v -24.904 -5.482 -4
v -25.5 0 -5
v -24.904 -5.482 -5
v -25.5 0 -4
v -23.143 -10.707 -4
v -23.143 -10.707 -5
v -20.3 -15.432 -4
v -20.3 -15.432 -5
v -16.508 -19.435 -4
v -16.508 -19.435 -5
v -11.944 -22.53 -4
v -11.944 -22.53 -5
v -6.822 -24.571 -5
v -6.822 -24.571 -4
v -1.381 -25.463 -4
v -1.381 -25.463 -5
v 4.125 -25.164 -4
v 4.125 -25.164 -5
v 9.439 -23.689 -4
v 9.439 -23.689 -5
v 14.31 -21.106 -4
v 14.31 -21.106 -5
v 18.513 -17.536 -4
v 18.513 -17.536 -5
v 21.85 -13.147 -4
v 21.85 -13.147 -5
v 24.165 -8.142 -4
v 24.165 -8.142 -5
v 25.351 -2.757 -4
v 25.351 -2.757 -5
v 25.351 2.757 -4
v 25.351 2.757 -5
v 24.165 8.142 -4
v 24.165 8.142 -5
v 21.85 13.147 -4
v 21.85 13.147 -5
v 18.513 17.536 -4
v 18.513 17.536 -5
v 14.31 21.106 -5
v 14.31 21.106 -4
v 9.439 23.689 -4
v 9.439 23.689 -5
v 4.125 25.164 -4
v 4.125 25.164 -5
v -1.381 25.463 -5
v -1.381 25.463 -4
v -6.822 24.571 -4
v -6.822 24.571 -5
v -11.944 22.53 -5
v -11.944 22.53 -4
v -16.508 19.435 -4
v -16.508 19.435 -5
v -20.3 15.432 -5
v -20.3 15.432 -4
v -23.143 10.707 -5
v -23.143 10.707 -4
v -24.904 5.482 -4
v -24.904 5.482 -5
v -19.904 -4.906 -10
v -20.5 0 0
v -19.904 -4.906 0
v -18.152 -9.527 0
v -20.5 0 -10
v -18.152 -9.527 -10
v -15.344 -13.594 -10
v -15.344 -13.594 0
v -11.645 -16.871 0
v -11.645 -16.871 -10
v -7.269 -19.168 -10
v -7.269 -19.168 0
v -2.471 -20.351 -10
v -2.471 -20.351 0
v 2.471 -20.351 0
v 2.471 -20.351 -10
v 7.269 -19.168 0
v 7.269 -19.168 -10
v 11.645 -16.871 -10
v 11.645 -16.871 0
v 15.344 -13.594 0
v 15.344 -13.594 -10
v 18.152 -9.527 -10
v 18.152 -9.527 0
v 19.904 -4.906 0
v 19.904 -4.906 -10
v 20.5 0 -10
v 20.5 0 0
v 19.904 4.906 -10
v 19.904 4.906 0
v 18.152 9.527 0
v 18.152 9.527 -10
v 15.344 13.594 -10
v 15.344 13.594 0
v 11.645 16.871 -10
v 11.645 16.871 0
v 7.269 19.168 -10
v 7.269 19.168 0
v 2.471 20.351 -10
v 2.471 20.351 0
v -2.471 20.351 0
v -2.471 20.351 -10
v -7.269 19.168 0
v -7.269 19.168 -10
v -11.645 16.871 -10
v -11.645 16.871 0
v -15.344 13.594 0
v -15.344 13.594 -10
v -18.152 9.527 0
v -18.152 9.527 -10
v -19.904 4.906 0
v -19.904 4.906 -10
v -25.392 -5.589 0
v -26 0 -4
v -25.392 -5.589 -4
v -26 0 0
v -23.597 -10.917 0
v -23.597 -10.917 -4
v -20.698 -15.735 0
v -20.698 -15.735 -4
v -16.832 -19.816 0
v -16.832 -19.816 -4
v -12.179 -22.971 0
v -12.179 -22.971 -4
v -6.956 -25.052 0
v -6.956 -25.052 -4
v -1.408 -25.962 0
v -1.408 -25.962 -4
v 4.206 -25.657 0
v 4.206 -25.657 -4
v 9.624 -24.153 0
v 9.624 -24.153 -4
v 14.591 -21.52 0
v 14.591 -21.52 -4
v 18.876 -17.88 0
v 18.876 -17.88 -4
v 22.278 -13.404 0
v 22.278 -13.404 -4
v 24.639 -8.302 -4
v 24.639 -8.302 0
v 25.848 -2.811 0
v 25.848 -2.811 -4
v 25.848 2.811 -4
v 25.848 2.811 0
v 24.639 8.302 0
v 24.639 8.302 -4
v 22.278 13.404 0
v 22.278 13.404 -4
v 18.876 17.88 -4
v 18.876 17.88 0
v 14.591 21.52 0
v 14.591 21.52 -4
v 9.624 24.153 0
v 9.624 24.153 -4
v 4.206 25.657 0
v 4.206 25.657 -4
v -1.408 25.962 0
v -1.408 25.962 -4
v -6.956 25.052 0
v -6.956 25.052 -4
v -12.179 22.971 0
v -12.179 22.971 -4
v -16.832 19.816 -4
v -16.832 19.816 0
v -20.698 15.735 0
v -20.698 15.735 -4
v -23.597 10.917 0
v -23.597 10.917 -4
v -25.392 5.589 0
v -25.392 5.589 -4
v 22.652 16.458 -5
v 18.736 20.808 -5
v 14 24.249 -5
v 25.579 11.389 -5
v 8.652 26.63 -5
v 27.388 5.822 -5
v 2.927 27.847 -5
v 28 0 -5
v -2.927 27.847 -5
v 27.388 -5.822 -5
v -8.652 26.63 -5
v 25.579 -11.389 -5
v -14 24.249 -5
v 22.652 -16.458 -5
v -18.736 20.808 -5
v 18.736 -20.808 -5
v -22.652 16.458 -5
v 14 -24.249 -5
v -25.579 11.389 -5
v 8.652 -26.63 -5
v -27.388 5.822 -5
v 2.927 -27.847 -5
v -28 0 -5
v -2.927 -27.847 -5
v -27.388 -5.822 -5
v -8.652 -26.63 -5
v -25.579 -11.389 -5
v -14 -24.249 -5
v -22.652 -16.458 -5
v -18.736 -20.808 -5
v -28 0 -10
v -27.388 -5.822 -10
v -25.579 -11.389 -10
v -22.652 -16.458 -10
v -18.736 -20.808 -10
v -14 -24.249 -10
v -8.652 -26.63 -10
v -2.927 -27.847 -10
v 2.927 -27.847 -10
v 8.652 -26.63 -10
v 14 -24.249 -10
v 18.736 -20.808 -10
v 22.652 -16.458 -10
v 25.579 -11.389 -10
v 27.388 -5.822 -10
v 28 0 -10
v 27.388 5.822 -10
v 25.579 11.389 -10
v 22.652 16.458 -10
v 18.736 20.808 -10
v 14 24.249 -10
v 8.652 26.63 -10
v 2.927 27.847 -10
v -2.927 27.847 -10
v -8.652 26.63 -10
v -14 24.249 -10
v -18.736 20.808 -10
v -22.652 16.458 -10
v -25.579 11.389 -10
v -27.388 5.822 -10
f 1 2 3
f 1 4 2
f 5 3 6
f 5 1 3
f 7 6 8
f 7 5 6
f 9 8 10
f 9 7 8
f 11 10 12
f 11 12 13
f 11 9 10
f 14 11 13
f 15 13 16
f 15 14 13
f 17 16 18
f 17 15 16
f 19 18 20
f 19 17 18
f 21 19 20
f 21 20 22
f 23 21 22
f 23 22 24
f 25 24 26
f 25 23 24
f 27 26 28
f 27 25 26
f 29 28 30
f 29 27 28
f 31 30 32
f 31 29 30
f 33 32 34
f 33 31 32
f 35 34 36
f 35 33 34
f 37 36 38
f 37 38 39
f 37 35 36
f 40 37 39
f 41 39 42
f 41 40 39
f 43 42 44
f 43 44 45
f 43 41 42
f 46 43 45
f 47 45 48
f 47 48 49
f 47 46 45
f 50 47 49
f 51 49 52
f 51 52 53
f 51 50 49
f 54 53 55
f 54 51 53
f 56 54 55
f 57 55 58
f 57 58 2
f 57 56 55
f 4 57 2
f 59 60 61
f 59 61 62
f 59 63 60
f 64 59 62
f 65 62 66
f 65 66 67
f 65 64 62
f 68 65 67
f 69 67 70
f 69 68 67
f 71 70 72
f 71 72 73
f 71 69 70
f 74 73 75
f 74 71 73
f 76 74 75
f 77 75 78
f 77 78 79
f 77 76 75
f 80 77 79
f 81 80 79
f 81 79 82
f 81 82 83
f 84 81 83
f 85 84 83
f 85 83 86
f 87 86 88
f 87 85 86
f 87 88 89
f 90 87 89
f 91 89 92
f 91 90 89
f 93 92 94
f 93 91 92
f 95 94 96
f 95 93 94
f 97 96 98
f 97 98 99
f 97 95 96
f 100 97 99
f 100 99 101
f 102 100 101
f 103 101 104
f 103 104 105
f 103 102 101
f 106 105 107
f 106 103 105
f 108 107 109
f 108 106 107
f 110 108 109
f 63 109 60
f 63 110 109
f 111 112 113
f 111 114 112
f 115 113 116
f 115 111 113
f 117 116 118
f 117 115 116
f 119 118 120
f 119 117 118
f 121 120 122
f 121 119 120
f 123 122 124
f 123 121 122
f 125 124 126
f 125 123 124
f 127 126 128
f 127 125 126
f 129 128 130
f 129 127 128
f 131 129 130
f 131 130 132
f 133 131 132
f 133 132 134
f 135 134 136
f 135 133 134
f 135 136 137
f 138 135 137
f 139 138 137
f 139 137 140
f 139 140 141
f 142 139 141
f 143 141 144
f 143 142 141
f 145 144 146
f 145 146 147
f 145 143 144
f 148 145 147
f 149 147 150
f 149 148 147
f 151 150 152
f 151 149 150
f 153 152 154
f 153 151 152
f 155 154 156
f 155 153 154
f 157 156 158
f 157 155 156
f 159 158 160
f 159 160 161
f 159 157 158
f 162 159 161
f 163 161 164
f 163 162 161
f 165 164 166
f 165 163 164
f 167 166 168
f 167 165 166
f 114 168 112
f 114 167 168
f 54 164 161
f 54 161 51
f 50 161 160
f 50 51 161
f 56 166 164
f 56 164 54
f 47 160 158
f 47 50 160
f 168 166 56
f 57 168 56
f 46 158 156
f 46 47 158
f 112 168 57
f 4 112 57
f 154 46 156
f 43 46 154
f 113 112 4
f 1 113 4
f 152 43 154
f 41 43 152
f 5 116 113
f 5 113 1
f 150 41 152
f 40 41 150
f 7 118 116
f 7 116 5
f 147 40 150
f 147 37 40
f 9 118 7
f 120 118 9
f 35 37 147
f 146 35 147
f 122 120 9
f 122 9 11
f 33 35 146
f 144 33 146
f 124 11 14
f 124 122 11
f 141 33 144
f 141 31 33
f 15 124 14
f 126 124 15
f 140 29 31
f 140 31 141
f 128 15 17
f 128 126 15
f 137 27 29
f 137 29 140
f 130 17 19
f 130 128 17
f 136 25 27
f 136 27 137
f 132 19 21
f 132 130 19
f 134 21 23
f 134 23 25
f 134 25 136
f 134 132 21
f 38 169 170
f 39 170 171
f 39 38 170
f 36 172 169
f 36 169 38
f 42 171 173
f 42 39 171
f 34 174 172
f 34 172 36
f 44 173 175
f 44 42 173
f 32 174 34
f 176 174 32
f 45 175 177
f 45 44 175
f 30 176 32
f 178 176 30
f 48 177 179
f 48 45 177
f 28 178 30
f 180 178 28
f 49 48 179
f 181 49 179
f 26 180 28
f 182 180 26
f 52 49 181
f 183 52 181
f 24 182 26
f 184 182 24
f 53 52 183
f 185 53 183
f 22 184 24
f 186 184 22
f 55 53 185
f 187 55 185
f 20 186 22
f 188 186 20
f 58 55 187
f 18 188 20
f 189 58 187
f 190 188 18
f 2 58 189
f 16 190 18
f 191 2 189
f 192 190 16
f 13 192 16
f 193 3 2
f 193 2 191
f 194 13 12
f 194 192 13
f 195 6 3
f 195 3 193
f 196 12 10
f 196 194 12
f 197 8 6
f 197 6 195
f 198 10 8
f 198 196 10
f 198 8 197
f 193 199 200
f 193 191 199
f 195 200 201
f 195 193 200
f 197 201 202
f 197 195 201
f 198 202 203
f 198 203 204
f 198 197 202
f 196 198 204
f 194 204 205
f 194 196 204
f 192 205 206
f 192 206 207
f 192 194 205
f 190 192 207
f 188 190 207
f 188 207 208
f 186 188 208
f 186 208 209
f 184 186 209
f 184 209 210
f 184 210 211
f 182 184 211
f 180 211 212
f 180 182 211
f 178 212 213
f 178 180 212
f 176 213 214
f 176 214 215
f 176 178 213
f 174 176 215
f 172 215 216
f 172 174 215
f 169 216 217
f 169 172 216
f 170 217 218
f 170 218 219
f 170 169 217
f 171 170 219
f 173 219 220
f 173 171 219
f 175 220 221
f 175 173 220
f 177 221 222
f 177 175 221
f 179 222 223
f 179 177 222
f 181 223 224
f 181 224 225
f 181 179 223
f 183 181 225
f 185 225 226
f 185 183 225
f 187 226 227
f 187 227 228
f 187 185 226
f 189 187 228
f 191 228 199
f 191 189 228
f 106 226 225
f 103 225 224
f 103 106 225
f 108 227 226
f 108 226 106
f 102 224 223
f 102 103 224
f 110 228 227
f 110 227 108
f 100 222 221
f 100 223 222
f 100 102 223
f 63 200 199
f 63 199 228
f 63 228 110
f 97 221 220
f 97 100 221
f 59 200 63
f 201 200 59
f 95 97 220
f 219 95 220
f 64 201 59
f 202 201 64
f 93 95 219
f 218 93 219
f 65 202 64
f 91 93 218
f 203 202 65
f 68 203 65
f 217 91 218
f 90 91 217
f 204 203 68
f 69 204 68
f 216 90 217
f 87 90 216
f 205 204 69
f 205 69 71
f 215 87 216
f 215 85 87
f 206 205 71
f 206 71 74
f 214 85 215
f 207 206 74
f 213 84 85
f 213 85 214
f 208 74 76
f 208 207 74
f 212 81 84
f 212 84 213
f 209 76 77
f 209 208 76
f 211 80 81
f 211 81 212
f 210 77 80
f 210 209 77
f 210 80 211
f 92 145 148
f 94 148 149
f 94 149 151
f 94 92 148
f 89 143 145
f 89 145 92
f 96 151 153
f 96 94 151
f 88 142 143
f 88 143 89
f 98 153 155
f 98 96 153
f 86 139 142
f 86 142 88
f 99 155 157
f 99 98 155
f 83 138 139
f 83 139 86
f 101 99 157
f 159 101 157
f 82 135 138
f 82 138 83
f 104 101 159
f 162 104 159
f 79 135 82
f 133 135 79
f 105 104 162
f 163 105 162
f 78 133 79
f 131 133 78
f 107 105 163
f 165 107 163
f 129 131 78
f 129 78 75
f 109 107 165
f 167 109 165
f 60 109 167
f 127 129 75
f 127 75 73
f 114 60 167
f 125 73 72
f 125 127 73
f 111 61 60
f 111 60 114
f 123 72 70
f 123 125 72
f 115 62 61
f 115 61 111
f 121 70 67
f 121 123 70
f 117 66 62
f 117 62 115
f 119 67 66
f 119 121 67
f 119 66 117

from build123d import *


with BuildPart() as part:
    # 草图1 → 旋转1 (revolve)
    with BuildSketch(Plane(origin=(0, 0, 0), x_dir=(1, 0, 0), z_dir=(0, 1, 0)), mode=Mode.PRIVATE) as revolve_1_sk:
        Polygon((20.5, 0), (20.5, 10), (28, 10), (28, 5), (25.5, 5), (25.5, 4), (26, 4), (26, 0), align=None)
    revolve(revolve_1_sk.sketch.rotate(Axis((0, 0, -19.14057971), (0, 0, 1)), 180), axis=Axis((0, 0, -19.14057971), (0, 0, 1)))  # turned: the seam where the file's is


solid = part.part
